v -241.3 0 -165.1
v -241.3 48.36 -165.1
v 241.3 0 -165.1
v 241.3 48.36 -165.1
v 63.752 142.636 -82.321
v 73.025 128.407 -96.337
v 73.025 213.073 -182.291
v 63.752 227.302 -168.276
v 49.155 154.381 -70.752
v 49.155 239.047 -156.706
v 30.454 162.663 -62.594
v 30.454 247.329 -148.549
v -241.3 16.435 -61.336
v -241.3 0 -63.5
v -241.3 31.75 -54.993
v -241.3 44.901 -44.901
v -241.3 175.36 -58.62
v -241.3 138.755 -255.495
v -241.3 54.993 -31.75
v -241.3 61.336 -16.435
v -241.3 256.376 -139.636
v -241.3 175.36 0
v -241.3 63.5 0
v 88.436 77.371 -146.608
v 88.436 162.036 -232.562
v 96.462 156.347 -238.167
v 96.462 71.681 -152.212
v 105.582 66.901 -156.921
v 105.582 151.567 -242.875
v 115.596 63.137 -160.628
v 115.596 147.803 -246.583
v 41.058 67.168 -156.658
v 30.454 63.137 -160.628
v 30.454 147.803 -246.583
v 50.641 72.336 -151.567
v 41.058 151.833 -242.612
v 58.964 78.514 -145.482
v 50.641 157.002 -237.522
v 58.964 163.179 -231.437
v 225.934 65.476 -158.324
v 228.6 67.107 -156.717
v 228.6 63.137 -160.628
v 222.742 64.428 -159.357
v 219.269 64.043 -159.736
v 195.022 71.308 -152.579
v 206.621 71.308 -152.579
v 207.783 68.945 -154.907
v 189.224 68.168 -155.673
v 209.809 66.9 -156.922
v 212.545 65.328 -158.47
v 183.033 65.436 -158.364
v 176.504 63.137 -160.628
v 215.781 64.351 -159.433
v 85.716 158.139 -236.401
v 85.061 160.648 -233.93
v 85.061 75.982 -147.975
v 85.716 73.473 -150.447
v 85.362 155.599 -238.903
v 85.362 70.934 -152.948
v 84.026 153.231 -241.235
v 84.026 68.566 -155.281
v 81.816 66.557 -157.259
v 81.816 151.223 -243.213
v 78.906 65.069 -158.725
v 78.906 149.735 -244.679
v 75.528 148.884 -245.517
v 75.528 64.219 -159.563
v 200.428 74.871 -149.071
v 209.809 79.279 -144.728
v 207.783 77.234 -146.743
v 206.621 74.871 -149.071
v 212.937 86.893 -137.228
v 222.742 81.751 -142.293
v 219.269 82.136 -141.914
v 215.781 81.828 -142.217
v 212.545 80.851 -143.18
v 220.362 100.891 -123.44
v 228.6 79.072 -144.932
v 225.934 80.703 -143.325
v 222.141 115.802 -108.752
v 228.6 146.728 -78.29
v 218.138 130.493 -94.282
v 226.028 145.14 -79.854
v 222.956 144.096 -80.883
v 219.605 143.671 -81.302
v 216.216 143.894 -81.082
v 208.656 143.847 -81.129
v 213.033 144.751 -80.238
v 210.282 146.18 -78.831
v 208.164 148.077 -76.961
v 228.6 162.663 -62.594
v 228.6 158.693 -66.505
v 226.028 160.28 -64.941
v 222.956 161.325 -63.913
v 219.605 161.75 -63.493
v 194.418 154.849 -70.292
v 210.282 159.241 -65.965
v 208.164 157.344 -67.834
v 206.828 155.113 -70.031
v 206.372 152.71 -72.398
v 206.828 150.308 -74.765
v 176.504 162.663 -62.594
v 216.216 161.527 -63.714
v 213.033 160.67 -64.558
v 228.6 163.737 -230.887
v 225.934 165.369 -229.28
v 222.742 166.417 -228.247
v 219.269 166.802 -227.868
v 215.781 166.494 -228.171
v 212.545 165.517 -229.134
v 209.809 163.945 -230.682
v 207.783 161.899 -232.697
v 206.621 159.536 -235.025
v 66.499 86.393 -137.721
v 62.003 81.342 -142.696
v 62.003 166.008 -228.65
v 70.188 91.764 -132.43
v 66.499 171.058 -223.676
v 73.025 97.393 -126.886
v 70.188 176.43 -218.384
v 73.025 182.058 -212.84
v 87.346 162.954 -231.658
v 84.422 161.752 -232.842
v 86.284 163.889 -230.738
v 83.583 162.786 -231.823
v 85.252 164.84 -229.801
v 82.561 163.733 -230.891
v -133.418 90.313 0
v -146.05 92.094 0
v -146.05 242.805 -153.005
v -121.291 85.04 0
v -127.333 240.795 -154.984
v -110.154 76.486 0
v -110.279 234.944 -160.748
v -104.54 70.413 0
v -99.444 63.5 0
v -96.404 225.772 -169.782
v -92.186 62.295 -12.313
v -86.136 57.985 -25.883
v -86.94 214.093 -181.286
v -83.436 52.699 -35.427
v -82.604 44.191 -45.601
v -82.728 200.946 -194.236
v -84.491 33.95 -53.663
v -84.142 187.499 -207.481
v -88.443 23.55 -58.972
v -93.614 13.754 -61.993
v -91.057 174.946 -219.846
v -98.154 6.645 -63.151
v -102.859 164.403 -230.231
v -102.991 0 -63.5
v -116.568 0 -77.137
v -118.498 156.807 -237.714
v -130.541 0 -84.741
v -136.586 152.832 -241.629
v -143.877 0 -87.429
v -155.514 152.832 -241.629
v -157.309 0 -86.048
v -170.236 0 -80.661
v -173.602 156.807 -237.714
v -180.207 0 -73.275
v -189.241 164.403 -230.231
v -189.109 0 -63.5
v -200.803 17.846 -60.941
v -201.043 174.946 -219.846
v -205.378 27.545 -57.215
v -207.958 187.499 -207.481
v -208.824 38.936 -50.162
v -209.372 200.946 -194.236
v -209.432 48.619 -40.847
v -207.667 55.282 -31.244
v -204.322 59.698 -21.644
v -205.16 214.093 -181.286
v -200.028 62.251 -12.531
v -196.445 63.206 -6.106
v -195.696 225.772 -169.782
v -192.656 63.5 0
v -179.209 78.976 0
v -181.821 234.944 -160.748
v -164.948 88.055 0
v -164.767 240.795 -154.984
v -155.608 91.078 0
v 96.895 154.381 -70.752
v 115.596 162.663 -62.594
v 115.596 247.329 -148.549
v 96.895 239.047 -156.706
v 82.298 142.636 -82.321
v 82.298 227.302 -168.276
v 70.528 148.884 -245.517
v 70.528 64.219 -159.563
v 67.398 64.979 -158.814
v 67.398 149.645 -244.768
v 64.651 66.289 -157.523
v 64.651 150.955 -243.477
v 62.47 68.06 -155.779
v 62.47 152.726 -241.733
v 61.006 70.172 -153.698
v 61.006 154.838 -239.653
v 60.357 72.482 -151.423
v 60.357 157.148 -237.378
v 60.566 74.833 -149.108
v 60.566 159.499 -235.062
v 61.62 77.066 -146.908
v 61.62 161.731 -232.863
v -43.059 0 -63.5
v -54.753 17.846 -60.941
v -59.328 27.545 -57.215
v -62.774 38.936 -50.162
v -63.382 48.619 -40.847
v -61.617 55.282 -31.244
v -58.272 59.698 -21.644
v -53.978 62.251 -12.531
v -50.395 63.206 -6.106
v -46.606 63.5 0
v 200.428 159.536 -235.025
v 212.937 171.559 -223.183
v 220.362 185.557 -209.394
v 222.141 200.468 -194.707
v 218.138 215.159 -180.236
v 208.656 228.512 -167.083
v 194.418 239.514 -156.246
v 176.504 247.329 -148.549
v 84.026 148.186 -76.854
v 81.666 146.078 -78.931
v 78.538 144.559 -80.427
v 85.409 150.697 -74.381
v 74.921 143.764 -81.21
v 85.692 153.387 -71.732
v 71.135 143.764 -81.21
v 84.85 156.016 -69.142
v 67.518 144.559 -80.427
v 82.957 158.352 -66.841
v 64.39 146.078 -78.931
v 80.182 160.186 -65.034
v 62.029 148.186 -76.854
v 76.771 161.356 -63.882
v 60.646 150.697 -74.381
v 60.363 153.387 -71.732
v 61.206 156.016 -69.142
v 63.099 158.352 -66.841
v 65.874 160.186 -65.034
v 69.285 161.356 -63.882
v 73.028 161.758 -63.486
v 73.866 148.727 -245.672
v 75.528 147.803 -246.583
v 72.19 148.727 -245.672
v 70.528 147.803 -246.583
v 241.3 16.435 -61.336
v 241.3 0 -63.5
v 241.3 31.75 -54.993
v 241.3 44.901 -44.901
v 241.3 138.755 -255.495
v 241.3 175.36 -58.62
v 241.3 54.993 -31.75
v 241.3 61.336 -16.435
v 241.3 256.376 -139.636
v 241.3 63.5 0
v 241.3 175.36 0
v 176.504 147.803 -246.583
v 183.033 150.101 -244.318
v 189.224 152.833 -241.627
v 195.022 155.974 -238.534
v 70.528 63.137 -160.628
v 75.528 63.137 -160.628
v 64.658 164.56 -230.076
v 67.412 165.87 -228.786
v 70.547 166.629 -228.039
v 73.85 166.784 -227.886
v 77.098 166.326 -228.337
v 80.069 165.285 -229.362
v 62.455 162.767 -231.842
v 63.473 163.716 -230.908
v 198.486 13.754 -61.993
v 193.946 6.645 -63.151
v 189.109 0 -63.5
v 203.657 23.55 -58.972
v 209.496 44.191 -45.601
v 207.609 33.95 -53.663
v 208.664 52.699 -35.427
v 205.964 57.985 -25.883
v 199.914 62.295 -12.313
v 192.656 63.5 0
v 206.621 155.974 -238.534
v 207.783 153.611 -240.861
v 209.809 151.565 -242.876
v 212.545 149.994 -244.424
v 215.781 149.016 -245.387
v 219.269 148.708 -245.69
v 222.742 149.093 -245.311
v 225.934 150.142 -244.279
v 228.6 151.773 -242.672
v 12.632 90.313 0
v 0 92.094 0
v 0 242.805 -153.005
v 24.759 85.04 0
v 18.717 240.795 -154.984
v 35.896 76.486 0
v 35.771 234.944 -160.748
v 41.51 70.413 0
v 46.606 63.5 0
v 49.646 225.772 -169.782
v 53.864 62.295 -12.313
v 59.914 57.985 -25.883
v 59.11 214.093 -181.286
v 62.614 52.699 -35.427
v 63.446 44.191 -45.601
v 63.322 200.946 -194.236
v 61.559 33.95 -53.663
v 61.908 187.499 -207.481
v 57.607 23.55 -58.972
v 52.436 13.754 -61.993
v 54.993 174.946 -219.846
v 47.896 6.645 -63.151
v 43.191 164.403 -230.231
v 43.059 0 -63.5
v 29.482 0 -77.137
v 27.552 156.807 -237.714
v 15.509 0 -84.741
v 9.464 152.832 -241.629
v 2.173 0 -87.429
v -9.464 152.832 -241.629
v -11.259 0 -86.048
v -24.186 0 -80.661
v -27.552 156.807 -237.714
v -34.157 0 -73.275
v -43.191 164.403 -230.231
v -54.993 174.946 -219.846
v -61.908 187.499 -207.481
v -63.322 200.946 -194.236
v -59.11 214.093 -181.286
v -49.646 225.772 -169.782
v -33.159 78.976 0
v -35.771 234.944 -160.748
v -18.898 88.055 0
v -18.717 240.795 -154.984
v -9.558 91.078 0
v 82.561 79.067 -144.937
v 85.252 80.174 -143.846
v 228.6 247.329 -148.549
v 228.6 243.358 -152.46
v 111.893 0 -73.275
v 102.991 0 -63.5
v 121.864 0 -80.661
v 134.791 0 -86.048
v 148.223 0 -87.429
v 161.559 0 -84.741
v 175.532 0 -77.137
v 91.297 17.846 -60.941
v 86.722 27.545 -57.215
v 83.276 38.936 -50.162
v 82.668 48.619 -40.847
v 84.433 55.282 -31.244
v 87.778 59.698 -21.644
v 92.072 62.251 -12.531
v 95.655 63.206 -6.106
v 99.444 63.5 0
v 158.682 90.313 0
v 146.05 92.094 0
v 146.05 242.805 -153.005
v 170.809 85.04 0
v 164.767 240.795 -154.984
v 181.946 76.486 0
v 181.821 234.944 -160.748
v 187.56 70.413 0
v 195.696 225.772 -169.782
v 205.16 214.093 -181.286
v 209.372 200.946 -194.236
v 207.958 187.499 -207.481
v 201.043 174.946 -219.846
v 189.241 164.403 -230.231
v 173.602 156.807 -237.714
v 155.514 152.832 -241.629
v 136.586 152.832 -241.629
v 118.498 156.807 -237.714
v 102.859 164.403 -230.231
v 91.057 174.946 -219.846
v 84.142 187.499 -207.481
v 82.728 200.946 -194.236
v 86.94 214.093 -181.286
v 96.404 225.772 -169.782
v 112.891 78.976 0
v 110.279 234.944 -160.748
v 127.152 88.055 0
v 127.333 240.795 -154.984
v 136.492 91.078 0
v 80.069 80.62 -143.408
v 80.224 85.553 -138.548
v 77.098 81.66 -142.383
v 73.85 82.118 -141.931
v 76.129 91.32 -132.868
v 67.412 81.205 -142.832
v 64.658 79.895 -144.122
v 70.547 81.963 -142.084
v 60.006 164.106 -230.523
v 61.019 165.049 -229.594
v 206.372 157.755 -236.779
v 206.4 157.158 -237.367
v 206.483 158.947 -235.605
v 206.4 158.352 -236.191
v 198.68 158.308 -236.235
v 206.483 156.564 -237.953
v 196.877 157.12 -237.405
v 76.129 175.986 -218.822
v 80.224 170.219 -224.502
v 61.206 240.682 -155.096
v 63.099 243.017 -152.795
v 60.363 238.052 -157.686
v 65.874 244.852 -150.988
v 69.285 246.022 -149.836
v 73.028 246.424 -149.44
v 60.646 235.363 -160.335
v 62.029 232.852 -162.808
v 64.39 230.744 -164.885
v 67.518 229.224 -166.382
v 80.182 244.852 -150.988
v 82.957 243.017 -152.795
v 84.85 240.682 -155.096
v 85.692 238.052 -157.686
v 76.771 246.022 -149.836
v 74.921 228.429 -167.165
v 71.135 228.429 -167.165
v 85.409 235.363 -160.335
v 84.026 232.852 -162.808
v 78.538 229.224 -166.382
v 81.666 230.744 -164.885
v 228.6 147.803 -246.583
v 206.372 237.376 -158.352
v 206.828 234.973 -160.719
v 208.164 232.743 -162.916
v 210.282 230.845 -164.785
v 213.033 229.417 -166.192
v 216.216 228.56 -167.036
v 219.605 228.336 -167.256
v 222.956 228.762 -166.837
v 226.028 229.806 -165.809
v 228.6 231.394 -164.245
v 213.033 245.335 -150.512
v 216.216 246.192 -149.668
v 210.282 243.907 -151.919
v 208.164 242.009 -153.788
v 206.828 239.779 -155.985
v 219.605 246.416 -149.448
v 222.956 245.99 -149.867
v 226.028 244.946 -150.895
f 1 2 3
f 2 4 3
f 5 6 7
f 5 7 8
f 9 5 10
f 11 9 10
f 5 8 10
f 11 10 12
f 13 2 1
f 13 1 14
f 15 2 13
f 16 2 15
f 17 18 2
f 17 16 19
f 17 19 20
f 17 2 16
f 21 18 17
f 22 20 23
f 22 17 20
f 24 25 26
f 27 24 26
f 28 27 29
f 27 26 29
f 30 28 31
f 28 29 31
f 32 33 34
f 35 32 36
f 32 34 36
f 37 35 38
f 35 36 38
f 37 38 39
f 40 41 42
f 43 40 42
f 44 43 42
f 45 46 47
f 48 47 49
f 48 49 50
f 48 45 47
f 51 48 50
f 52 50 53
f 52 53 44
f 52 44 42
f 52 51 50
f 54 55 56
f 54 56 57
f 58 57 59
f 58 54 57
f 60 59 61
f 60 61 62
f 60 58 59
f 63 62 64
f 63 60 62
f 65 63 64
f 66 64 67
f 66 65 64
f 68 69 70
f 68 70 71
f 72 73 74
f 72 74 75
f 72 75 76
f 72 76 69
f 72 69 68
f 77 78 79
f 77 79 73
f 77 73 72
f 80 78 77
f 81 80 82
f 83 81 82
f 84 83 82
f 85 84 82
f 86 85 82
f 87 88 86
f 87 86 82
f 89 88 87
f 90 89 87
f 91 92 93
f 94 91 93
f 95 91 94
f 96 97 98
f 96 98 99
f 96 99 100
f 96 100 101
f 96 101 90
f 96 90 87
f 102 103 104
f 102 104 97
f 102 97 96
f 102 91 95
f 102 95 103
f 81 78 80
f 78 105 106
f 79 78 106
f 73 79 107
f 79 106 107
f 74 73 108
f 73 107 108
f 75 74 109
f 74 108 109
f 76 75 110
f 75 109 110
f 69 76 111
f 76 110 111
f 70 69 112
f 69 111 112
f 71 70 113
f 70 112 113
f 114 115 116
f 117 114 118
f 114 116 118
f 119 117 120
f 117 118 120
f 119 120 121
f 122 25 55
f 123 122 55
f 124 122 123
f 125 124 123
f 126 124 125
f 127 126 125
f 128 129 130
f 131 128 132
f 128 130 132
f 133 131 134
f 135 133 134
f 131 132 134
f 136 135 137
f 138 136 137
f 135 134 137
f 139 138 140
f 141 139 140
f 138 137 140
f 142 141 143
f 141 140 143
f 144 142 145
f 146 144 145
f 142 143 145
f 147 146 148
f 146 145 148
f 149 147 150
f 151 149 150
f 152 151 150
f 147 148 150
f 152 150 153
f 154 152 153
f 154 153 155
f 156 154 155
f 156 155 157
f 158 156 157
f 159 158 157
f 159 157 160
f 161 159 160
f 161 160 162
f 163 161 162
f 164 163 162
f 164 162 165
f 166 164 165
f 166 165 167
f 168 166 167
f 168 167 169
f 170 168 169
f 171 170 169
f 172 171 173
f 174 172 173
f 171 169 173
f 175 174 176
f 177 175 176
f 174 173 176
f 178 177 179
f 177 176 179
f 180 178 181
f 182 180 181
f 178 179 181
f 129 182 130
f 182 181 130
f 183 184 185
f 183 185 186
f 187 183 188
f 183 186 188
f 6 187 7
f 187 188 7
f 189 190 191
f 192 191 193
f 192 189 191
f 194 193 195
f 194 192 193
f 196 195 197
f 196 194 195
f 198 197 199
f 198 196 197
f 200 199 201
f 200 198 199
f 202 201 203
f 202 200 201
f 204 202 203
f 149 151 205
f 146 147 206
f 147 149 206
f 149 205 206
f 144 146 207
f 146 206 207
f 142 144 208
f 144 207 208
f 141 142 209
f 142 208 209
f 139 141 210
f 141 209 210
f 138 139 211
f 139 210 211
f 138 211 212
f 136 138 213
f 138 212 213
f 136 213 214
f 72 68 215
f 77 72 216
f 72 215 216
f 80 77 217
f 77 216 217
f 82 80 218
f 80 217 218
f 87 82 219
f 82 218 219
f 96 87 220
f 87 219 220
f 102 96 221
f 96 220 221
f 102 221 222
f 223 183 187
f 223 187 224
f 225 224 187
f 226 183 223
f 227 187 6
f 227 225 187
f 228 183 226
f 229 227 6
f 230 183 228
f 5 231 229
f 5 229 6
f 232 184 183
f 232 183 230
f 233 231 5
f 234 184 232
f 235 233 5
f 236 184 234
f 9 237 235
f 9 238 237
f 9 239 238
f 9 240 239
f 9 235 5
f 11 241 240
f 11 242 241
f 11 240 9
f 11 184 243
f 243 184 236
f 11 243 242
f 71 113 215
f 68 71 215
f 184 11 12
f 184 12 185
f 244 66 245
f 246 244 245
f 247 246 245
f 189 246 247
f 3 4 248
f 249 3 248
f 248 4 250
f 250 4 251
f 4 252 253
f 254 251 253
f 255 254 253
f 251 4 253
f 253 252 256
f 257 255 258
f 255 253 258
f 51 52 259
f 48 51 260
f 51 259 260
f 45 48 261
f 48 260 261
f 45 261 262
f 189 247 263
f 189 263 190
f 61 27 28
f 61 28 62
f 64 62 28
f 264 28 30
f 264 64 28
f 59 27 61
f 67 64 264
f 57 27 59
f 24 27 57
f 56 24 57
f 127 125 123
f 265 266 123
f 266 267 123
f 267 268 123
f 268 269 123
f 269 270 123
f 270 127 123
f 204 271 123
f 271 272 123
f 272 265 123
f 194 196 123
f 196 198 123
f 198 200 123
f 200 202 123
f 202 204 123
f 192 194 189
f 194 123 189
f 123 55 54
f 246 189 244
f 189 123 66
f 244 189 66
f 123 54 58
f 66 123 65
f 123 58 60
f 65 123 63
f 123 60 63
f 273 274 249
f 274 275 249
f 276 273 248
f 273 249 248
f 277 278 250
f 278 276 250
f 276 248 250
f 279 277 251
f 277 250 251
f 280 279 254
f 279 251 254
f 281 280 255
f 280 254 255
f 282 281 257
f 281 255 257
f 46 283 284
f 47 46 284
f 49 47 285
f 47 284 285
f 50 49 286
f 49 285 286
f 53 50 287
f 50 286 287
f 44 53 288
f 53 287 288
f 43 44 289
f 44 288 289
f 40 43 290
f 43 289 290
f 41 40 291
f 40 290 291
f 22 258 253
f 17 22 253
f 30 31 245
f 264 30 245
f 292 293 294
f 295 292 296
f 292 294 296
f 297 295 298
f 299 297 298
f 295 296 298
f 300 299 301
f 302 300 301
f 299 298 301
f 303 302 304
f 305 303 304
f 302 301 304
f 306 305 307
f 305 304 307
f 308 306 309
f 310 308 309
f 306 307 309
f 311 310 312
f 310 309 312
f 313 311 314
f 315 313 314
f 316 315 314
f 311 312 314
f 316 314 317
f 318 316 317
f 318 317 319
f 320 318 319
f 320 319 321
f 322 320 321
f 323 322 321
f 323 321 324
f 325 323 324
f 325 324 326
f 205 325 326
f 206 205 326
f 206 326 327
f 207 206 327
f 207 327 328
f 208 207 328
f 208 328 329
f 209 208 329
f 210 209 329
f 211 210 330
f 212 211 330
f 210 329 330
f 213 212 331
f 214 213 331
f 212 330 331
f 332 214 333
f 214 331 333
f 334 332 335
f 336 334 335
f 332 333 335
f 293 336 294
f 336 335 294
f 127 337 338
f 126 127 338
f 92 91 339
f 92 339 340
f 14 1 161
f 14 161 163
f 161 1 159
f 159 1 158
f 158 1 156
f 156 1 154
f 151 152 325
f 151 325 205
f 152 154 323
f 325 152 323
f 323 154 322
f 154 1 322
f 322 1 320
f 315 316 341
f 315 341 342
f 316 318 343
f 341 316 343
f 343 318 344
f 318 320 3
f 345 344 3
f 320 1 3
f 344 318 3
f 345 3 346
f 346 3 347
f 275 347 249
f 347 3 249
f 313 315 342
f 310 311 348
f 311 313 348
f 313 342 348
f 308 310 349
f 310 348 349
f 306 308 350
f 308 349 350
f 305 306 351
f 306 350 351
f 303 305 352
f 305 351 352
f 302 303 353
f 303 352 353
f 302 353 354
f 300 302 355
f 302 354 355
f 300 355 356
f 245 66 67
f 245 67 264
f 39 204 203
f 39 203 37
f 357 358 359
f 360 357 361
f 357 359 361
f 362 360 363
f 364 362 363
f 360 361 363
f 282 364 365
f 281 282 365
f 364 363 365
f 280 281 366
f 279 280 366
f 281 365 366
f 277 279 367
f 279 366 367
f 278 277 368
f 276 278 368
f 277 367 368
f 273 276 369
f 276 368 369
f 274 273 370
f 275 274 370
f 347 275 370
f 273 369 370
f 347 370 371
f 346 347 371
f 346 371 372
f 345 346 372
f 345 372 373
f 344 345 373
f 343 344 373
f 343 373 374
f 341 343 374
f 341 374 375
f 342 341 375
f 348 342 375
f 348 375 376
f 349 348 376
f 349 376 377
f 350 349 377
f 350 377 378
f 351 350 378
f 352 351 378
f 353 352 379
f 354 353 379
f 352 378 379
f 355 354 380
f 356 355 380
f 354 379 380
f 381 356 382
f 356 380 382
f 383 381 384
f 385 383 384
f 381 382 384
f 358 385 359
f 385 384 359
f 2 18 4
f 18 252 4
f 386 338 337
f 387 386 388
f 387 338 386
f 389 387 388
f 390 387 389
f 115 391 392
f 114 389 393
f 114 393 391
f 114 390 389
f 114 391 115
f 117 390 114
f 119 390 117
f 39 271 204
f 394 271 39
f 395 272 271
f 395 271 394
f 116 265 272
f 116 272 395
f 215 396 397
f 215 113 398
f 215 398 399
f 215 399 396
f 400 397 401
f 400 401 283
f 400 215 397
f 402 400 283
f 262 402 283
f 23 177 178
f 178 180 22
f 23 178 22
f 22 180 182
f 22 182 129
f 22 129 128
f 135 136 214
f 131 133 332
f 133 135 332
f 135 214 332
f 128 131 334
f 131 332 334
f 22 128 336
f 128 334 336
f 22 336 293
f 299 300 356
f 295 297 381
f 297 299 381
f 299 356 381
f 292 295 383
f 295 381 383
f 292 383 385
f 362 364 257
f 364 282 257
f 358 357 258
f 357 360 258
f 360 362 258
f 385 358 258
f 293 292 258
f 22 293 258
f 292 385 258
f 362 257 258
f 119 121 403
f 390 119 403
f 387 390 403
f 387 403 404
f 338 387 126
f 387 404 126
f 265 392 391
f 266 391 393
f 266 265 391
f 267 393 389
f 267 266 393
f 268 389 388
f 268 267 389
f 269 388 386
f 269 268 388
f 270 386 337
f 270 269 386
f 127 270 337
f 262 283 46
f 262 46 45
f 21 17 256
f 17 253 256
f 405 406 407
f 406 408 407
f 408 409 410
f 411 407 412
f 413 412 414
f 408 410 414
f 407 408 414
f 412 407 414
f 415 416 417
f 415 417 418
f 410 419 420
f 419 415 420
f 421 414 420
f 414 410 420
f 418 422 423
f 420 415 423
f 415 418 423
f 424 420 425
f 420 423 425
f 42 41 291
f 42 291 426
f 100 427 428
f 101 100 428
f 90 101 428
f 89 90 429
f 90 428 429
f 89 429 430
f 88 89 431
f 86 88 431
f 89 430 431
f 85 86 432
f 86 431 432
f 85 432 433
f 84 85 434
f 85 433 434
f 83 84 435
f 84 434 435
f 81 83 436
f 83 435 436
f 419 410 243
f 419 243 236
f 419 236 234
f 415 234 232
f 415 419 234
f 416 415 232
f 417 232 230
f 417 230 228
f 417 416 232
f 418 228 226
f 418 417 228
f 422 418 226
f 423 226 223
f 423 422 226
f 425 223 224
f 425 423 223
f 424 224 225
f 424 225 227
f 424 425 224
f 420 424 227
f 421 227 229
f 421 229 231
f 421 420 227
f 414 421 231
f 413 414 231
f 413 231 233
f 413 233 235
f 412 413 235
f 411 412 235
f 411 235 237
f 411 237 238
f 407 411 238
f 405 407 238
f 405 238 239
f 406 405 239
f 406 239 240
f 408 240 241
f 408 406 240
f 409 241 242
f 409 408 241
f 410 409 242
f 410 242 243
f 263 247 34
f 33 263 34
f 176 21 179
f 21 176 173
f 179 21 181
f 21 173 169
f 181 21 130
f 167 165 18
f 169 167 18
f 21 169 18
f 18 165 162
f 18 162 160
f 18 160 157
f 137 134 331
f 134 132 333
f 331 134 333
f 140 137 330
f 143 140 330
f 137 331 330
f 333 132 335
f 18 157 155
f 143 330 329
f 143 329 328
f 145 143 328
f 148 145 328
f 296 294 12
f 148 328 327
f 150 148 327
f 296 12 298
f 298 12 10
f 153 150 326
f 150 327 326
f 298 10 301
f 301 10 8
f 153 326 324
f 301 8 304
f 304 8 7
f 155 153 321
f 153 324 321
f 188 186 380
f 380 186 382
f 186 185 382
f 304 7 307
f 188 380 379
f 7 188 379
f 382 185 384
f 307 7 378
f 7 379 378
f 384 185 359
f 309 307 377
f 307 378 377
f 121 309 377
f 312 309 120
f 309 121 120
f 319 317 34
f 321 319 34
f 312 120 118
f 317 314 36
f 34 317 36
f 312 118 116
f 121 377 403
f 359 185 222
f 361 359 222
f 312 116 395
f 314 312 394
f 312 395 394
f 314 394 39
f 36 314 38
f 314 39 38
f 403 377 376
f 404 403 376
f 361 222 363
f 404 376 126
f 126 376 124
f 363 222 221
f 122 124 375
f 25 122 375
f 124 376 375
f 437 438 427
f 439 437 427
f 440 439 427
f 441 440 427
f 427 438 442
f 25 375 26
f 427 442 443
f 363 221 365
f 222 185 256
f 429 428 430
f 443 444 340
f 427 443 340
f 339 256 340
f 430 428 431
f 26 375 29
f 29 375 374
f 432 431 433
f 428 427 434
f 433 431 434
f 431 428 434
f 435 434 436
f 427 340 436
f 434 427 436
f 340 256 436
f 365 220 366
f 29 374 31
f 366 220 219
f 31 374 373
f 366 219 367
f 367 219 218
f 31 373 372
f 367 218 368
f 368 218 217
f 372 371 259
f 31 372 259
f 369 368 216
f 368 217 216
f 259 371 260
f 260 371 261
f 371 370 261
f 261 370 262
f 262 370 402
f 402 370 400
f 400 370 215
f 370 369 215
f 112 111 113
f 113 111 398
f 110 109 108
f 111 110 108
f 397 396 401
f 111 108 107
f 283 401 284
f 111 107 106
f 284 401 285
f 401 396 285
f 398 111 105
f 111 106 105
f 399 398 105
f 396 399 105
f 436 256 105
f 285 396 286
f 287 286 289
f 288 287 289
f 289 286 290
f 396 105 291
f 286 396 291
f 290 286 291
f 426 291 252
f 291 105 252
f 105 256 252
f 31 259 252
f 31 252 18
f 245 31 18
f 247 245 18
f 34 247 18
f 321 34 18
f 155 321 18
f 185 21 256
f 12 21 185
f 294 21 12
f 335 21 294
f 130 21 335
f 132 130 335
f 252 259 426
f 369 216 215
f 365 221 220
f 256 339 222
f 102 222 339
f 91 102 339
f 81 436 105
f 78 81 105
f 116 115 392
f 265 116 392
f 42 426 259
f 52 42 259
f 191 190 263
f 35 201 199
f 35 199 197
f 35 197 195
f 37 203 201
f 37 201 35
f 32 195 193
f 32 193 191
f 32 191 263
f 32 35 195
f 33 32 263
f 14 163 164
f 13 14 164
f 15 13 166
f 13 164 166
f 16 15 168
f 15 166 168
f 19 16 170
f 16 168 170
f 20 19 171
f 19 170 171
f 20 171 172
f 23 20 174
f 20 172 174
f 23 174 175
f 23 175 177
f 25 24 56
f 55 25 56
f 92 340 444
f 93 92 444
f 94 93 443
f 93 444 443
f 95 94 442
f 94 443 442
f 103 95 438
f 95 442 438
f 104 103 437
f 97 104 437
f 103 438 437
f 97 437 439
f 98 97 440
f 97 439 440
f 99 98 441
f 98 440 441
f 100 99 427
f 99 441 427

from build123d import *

# Parameters (mm, degrees)
BOSS_EXTRUDE1_DEPTH = 241.3
SKETCH2_R           = 63.5
CUT_EXTRUDE1_DEPTH  = 482.6
SKETCH4_R           = 12.7
CUT_EXTRUDE3_DEPTH  = 120.65
RIB1_START          = -120.65
RIB1_DEPTH          = 120.65
RIB2_REACH          = 371.169
RIB3_REACH          = 371.169
SKETCH7_WALLS_W     = 749.266761297
SKETCH7_WALLS_H     = 5


# Read off the part's stored shape, not the designer's step: Rib1
with BuildPart() as part:
    # Sketch1 → Boss-Extrude1 (new, symmetric)
    with BuildSketch(Plane(origin=(0, 0, 0), x_dir=(0, 0, -1), z_dir=(1, 0, 0))):
        with BuildLine():
            Line((0, 175.36), (58.62, 175.36))
            Line((58.62, 175.36), (139.636486112, 256.376486112))
            Line((139.636486112, 256.376486112), (255.494783215, 138.754783215))
            Line((255.494783215, 138.754783215), (165.1, 48.36))
            Line((165.1, 48.36), (165.1, 0))
            Line((165.1, 0), (63.5, 0))
            ThreePointArc((63.5, 0), (44.901280605, 44.901280605), (0, 63.5))
            Line((0, 63.5), (0, 175.36))
        make_face()
    extrude(amount=BOSS_EXTRUDE1_DEPTH, both=True)

    # Sketch2 → Cut-Extrude1 (cut)
    with BuildSketch(Plane(origin=(0, 196.062295457, -199.046435538), x_dir=(-1, 0, 0), z_dir=(0, 0.7017461968633759, -0.7124270314830763))):
        with Locations(Location((-146.05, 2.11016587, 0), (0, 0, 90))):
            Circle(SKETCH2_R)
        with Locations(Location((0, 2.11016587, 0), (0, 0, 90))):
            Circle(SKETCH2_R)
        with Locations(Location((146.05, 2.11016587, 0), (0, 0, 90))):
            Circle(SKETCH2_R)
    extrude(amount=-CUT_EXTRUDE1_DEPTH, mode=Mode.SUBTRACT)

    # Sketch4 → Cut-Extrude3 (cut)
    # profile 1 of 3: a face of its own
    with BuildSketch(Plane(origin=(0, 196.062295457, -199.046435538), x_dir=(-1, 0, 0), z_dir=(0, 0.7017461968632962, -0.7124270314831548))):
        with BuildLine():
            Line((-228.6, -62.166812966), (-228.6, -67.73983413))
            Line((-228.6, -67.73983413), (-176.503530173, -67.73983413))
            ThreePointArc((-176.503530173, -67.73983413), (-222.25, 2.11016587), (-176.503530173, 71.96016587))
            Line((-176.503530173, 71.96016587), (-228.6, 71.96016587))
            Line((-228.6, 71.96016587), (-228.6, 66.387144707))
            ThreePointArc((-228.6, 66.387144707), (-214.584025044, 69.870701255), (-206.372106927, 57.99016587))
            ThreePointArc((-206.372106927, 57.99016587), (-214.584025044, 46.109630486), (-228.6, 49.593187034))
            Line((-228.6, 49.593187034), (-228.6, -45.372855293))
            ThreePointArc((-228.6, -45.372855293), (-214.584025044, -41.889298745), (-206.372106927, -53.76983413))
            ThreePointArc((-206.372106927, -53.76983413), (-214.584025044, -65.650369514), (-228.6, -62.166812966))
        make_face()
    # profile 2 of 3: a face of its own
    with BuildSketch(Plane(origin=(0, 196.062295457, -199.046435538), x_dir=(-1, 0, 0), z_dir=(0, 0.7017461968632962, -0.7124270314831548))):
        with BuildLine():
            Line((-30.453530173, 71.96016587), (-115.596469827, 71.96016587))
            ThreePointArc((-115.596469827, 71.96016587), (-88.997809808, 52.622417793), (-73.025, 23.876869227))
            ThreePointArc((-73.025, 23.876869227), (-57.052190192, 52.622417793), (-30.453530173, 71.96016587))
        make_face()
        with Locations(Location((-73.027893073, 57.99016587, 0), (0, 0, 90))):
            Circle(SKETCH4_R, mode=Mode.SUBTRACT)
    # profile 3 of 3: a face of its own
    with BuildSketch(Plane(origin=(0, 196.062295457, -199.046435538), x_dir=(-1, 0, 0), z_dir=(0, 0.7017461968632962, -0.7124270314831548))):
        with BuildLine():
            ThreePointArc((-73.025, -19.656537486), (-88.997809808, -48.402086052), (-115.596469827, -67.73983413))
            Line((-115.596469827, -67.73983413), (-30.453530173, -67.73983413))
            ThreePointArc((-30.453530173, -67.73983413), (-57.052190192, -48.402086052), (-73.025, -19.656537486))
        make_face()
        with Locations(Location((-73.027893073, -53.76983413, 0), (0, 0, 90))):
            Circle(SKETCH4_R, mode=Mode.SUBTRACT)
    extrude(amount=-CUT_EXTRUDE3_DEPTH, mode=Mode.SUBTRACT)

    # Rib1 outline → Rib1 (add)
    with BuildSketch(Plane(origin=(0, 196.062295457, -199.046435538), x_dir=(-1, 0, 0), z_dir=(0, 0.7017461968632962, -0.7124270314831548)).offset(RIB1_START)):
        with BuildLine():
            ThreePointArc((-85.252237114, -43.825354461), (-86.81154021, -45.819416661), (-88.436216043, -47.760586061))
            Line((-88.436216043, -47.760586061), (-85.061213526, -49.709144673))
            ThreePointArc((-85.061213526, -49.709144673), (-84.026415701, -47.41983413), (-82.561213527, -45.379017654))
            Line((-82.561213527, -45.379017654), (-85.252237114, -43.825354461))
        make_face()
        with BuildLine():
            ThreePointArc((-70.527893073, -66.221340063), (-73.027893073, -66.46983413), (-75.527893073, -66.221340063))
            Line((-75.527893073, -66.221340063), (-75.527893073, -67.73983413))
            Line((-75.527893073, -67.73983413), (-70.527893073, -67.73983413))
            Line((-70.527893073, -67.73983413), (-70.527893073, -66.221340063))
        make_face()
    extrude(amount=RIB1_DEPTH)

    # Sketch6 walls → Rib2 (add, up to next)
    with BuildSketch(Plane(origin=(0, 196.062295457, -199.046435538), x_dir=(-1, 0, 0), z_dir=(0, 0.7017461968632962, -0.7124270314831548)), mode=Mode.PRIVATE) as rib2_sk1:
        Polygon((-365.486871932, -280.7035923), (235.169541879, 178.910932933), (232.131085785, 182.881799912), (-368.525328026, -276.732725322), align=None)
    rib2_tool1 = extrude(rib2_sk1.sketch, amount=-RIB2_REACH, mode=Mode.PRIVATE) - part.part
    add(rib2_tool1.solids().sort_by_distance((66.677893073, 161.216850874, -233.369470927))[0])

    # Sketch7 walls → Rib3 (add, up to next)
    with BuildSketch(Plane(origin=(0, 196.062295457, -199.046435538), x_dir=(-1, 0, 0), z_dir=(0, 0.7017461968632962, -0.7124270314831548)), mode=Mode.PRIVATE) as rib3_sk1:
        with Locations((-201.90751874, -53.76983413)):
            Rectangle(SKETCH7_WALLS_W, SKETCH7_WALLS_H)
    rib3_tool1 = extrude(rib3_sk1.sketch, amount=-RIB3_REACH, mode=Mode.PRIVATE) - part.part
    add(rib3_tool1.solids().sort_by_distance((201.907518739, 157.755212144, -236.779212144))[0])


solid = part.part
